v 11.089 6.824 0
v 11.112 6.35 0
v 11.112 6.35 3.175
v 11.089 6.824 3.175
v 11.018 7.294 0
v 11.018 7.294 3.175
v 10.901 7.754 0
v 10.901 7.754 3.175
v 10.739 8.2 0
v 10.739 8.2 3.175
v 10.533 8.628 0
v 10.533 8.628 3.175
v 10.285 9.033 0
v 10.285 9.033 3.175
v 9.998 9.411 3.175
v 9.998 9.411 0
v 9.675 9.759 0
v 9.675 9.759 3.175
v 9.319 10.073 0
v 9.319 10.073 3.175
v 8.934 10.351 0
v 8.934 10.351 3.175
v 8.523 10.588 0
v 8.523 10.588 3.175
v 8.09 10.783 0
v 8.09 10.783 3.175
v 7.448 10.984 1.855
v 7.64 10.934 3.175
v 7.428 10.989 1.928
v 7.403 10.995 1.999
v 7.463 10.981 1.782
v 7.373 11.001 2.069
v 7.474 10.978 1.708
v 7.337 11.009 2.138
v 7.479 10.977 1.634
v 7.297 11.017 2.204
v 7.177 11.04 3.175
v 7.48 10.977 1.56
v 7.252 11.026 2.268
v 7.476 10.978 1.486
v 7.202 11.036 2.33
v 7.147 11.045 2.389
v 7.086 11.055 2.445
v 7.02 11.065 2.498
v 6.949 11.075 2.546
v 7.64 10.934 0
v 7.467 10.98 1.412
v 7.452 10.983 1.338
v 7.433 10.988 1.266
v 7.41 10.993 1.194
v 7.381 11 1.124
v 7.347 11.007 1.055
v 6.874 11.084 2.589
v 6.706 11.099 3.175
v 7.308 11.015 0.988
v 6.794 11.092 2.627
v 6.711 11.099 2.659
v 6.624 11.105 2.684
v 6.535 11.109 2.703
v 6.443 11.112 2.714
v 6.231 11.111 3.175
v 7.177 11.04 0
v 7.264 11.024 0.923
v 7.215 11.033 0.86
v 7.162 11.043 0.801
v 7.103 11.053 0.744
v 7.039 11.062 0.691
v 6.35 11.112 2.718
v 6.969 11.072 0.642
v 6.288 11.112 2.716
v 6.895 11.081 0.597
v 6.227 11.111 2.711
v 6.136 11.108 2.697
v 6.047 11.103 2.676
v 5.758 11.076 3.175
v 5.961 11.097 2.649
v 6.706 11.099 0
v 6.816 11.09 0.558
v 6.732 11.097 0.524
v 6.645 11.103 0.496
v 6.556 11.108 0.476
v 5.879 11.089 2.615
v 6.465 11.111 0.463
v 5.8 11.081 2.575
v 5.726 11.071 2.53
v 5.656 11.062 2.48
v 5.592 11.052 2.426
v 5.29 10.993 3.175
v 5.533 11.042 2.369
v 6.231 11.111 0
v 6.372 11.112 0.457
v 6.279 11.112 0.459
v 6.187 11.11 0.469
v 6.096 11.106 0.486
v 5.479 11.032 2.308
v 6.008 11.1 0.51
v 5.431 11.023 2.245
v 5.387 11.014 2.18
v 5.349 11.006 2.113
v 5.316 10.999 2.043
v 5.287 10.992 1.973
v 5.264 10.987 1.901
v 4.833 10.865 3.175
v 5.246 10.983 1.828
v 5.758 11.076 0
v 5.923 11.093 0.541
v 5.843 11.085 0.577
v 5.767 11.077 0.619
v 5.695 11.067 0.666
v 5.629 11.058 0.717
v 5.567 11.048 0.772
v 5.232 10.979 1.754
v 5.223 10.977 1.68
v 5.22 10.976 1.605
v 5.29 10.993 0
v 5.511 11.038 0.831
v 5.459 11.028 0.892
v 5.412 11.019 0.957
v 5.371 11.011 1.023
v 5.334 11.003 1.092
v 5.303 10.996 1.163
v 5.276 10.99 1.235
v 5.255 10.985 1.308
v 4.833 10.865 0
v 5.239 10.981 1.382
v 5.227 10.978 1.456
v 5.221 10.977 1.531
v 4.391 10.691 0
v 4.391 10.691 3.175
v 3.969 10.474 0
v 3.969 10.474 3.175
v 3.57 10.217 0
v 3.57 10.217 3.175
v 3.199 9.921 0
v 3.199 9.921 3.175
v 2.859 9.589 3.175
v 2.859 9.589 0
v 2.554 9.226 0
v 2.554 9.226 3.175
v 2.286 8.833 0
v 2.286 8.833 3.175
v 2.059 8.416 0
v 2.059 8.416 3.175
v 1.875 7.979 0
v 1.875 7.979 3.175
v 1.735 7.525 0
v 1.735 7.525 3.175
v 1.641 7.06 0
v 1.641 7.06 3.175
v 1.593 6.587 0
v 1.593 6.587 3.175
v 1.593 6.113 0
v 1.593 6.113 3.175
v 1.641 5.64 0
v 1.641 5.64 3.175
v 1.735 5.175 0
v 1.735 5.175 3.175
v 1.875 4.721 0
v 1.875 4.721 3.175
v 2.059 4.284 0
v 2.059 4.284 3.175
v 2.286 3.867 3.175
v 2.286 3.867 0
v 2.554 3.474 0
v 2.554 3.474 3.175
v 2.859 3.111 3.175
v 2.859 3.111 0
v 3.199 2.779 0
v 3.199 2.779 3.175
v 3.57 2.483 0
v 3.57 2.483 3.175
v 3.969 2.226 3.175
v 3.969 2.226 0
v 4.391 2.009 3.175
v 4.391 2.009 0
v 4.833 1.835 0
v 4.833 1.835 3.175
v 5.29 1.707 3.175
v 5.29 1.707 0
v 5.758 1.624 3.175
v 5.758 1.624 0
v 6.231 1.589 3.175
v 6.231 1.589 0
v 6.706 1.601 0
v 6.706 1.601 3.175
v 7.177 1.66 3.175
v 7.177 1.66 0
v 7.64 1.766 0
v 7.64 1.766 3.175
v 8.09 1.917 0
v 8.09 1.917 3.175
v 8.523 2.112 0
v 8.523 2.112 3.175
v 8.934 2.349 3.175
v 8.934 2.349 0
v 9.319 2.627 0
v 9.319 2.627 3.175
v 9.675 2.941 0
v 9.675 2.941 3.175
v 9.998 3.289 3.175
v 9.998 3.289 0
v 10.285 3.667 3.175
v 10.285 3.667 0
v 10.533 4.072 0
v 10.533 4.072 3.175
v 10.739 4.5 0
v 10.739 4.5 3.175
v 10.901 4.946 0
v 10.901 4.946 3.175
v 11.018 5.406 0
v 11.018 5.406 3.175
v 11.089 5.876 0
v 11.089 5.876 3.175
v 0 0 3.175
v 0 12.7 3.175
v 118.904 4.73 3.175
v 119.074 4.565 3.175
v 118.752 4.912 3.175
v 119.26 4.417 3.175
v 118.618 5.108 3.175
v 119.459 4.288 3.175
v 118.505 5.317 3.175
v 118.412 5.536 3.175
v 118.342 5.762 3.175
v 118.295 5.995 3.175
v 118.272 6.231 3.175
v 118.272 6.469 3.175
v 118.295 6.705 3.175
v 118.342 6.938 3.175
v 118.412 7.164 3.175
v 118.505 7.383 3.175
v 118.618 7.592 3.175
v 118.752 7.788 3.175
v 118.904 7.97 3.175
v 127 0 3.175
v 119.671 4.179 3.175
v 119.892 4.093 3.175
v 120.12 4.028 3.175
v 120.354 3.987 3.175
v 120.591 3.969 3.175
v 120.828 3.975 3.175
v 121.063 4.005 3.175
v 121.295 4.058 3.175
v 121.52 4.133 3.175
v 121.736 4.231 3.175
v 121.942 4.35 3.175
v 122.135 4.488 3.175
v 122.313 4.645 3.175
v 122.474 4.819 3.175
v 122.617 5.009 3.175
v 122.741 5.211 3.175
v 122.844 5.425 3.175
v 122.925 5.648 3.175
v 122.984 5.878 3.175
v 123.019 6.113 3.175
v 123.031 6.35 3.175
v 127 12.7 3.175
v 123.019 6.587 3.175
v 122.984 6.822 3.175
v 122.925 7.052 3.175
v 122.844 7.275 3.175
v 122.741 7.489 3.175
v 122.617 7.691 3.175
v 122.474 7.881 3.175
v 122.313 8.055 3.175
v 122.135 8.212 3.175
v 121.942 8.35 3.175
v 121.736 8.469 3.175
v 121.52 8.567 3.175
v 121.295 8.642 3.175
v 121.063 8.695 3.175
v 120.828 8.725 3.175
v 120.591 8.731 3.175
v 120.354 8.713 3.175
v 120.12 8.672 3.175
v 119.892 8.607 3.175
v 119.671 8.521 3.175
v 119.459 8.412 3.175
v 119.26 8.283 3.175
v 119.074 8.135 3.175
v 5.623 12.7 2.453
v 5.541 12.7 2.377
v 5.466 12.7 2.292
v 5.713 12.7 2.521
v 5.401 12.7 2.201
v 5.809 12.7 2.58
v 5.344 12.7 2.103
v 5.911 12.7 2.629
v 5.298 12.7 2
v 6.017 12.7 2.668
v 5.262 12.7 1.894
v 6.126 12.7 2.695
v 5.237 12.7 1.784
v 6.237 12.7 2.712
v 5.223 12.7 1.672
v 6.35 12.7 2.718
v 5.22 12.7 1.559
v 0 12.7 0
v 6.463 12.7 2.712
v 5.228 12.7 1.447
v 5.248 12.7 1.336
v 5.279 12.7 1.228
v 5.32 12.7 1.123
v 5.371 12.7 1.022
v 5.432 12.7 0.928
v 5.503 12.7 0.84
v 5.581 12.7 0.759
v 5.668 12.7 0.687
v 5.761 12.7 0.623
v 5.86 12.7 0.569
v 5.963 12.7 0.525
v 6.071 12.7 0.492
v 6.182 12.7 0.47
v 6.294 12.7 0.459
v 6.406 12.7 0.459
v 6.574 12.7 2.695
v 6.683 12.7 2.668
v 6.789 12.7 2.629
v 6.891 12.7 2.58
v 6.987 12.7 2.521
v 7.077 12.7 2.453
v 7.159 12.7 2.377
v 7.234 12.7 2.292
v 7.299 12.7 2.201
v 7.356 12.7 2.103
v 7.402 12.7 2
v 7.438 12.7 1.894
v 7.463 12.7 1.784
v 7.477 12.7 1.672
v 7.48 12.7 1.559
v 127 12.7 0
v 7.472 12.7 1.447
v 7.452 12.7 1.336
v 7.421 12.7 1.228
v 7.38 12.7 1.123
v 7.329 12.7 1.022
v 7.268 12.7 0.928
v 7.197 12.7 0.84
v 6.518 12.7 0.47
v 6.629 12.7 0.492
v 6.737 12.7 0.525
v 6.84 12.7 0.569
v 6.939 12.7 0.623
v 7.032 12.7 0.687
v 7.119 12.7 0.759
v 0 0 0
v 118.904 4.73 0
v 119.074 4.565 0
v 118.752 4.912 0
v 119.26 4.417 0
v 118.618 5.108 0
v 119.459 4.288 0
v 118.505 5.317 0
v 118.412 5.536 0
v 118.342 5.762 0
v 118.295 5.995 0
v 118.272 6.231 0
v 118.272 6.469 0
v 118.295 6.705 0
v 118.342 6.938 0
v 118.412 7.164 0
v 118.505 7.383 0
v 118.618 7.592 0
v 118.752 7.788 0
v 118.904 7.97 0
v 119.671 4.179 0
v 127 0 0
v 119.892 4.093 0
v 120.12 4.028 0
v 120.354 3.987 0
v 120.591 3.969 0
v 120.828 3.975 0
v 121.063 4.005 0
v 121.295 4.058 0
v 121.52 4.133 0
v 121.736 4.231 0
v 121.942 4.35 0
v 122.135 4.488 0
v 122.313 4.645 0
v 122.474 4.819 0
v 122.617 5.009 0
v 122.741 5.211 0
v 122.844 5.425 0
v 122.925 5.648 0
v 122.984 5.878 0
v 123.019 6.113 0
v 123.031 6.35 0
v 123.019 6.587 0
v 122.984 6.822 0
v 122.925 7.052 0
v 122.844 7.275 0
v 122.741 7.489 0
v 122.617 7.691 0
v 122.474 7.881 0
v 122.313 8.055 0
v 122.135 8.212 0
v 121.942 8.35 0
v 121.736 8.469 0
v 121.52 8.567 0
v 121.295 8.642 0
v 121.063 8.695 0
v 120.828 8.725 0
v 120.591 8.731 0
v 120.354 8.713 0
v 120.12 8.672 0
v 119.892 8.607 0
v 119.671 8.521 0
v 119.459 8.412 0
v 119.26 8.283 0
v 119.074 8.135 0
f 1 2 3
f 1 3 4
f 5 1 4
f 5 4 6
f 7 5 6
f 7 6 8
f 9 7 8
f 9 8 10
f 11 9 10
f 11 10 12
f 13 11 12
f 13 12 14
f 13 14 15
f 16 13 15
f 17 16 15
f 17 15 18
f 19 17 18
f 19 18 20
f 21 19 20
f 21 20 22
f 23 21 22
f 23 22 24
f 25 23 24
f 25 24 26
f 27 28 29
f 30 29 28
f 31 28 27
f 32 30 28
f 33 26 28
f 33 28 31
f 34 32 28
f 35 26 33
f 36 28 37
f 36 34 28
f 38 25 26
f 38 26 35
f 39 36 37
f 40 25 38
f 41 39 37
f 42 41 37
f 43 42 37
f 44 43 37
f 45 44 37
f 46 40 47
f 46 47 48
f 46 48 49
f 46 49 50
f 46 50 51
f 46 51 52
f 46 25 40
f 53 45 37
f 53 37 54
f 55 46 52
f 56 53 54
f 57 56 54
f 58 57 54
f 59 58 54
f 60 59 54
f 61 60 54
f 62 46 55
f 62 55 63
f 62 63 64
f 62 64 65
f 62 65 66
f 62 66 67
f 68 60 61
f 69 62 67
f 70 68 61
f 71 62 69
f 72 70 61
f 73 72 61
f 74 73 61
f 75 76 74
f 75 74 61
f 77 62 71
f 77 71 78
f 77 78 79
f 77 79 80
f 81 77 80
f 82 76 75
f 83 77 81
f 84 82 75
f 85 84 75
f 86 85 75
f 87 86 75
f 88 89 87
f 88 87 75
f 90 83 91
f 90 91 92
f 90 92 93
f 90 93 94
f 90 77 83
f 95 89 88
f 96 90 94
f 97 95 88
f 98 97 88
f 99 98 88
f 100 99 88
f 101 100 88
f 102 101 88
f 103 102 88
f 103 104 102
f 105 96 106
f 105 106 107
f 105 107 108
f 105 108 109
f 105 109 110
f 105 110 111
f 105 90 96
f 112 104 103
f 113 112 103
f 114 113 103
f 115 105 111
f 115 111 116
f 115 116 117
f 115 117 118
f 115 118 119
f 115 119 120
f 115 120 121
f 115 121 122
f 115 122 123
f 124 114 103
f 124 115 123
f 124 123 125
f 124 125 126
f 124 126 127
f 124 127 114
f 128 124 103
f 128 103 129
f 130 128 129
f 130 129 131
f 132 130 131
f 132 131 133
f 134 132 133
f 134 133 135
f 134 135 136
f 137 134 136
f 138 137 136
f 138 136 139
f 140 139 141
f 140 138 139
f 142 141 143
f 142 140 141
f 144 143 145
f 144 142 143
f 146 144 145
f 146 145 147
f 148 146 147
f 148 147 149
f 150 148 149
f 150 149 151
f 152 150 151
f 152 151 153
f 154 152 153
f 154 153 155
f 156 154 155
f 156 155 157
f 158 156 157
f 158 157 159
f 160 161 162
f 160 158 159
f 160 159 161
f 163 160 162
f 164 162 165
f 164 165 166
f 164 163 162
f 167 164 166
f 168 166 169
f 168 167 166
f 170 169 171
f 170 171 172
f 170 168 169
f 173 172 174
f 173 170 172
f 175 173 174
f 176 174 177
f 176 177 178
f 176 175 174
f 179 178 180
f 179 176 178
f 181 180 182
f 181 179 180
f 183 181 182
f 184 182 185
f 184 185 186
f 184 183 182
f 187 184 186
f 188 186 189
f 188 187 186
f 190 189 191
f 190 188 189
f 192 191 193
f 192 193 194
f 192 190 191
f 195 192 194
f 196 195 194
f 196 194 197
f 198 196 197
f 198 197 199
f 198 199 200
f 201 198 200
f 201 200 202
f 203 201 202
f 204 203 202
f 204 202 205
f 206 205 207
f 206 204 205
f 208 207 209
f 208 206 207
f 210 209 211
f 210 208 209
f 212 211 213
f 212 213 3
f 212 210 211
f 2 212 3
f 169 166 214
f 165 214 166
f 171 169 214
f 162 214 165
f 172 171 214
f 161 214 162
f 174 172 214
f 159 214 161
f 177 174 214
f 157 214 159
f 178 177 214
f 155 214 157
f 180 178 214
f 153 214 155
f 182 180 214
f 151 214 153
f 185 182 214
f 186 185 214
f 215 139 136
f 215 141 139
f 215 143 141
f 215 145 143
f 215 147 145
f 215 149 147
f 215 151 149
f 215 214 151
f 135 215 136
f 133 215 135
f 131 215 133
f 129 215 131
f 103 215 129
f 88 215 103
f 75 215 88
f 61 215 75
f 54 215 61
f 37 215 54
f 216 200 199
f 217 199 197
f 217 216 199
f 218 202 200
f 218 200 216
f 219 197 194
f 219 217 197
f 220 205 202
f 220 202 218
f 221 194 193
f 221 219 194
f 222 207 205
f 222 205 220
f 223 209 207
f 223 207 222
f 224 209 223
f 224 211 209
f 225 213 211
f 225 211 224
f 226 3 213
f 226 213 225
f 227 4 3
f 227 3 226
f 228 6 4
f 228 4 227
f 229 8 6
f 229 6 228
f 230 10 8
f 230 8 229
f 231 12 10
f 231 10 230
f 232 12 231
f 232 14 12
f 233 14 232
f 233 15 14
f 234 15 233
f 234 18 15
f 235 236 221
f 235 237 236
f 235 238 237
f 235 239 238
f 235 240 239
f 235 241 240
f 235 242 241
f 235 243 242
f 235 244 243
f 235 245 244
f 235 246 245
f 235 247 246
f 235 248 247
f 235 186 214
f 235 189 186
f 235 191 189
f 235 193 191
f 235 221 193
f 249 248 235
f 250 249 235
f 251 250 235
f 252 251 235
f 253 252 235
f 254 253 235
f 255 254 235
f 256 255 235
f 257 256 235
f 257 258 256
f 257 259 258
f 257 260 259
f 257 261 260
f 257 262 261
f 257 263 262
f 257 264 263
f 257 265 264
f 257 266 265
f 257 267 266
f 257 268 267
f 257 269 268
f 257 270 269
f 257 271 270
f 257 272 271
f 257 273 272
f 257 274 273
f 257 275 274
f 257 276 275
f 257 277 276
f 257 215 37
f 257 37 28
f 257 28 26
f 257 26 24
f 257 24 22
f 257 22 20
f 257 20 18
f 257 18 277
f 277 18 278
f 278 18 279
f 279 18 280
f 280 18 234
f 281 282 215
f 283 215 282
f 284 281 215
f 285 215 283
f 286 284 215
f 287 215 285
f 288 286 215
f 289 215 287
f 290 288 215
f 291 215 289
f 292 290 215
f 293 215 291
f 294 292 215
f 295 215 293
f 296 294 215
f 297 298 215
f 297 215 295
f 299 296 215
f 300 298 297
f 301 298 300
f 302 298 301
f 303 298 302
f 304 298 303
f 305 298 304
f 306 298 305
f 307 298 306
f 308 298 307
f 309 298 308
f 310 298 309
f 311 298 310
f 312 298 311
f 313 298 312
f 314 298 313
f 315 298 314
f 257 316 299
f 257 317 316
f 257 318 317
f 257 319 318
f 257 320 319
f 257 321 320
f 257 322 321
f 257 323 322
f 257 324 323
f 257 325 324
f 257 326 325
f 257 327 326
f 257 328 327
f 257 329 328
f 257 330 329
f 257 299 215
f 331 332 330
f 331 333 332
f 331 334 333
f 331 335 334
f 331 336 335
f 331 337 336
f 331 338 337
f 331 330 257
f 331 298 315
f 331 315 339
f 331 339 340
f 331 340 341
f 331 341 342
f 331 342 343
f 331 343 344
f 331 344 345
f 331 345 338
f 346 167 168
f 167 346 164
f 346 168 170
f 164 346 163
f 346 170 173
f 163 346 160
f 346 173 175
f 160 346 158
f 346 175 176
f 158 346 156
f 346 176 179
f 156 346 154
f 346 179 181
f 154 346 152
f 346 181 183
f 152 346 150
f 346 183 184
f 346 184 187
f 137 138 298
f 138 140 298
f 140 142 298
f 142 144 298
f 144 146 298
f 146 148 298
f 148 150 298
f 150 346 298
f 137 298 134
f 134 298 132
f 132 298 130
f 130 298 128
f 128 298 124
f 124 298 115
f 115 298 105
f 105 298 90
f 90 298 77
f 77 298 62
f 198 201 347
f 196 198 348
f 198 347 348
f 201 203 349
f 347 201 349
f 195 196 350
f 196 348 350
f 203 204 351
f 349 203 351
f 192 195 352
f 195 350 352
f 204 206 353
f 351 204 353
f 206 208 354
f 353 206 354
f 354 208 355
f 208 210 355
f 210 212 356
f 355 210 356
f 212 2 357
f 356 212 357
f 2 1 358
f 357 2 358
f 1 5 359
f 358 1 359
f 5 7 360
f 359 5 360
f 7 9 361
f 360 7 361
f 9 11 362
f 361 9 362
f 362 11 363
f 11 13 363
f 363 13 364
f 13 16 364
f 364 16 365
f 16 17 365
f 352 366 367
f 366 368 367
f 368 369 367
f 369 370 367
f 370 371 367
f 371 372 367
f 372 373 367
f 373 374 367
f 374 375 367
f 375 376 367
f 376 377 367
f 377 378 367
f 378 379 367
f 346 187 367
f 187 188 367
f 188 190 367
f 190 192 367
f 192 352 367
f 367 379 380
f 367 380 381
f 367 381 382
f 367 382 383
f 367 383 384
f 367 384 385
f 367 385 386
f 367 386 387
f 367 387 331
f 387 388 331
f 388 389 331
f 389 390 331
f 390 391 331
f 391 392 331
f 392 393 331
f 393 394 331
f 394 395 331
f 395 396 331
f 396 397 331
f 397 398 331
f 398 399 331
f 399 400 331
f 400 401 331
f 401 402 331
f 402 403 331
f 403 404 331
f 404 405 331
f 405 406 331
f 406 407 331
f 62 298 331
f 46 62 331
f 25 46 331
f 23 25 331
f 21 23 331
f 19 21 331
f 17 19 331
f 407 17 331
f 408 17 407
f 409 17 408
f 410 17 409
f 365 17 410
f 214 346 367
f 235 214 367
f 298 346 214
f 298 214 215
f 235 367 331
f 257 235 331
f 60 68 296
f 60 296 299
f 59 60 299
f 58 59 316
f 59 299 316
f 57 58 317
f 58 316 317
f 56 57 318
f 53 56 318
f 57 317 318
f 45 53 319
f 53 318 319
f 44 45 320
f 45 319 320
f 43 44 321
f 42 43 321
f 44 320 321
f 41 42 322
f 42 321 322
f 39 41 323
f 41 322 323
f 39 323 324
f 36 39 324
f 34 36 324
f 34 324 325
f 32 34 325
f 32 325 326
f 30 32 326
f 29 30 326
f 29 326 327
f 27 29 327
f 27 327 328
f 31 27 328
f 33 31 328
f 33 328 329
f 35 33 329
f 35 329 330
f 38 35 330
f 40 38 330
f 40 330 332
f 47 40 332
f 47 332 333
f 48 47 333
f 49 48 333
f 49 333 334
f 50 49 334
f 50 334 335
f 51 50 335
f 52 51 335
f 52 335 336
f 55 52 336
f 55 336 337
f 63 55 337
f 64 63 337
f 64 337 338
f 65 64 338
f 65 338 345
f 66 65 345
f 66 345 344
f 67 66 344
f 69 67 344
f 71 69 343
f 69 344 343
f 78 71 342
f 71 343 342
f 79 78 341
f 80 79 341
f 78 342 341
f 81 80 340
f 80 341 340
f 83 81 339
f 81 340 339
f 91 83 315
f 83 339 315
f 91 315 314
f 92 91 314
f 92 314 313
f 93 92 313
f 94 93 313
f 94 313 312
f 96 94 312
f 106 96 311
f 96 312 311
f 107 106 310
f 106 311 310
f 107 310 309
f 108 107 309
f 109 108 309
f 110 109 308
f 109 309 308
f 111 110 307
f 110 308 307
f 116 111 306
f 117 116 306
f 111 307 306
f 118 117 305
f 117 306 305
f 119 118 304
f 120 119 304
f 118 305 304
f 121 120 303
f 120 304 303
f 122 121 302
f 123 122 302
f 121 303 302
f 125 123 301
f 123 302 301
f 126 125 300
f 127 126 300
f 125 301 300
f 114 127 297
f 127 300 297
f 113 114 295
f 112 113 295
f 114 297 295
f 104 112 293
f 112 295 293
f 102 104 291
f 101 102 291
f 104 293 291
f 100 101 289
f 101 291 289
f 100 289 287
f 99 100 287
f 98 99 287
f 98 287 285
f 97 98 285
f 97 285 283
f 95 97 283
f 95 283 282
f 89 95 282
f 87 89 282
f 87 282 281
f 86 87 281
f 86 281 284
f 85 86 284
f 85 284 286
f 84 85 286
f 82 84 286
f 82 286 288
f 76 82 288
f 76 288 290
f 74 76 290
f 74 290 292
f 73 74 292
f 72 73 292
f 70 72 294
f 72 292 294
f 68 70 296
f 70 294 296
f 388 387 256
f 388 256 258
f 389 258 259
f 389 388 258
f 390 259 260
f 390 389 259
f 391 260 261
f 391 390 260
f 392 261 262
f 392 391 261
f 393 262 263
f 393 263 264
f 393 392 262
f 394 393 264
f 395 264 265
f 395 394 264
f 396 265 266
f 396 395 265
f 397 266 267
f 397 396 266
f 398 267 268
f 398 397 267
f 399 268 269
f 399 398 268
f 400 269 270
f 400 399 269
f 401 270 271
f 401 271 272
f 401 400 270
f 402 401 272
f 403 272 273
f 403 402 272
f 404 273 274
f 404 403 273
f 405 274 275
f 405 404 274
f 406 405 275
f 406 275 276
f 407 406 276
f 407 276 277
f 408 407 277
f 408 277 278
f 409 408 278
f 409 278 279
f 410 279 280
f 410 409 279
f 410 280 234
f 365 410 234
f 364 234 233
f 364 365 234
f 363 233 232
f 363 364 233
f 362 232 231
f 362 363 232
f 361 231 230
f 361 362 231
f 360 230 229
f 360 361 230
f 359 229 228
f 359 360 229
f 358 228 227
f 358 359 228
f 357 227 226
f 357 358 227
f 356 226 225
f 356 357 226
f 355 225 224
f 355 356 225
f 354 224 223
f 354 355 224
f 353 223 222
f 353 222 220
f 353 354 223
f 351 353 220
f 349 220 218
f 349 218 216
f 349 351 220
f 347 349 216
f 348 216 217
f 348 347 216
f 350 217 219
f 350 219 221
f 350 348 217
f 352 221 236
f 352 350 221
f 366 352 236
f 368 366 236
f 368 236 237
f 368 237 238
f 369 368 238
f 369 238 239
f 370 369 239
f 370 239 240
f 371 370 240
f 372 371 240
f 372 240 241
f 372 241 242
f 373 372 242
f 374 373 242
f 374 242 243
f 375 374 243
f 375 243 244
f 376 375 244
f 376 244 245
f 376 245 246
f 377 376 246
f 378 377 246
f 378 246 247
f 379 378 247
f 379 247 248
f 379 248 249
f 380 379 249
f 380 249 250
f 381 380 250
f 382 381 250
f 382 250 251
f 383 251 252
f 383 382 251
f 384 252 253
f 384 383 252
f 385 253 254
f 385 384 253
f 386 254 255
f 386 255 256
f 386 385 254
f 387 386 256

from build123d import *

# Parameters (mm, degrees)
SKETCH1_W           = 127
SKETCH1_H           = 12.7
SKETCH1_R           = 4.7625
SKETCH1_R_2         = 2.38125
BOSS_EXTRUDE1_DEPTH = 3.175
SKETCH2_R           = 1.1303
CUT_EXTRUDE1_DEPTH  = 6.35


with BuildPart() as part:
    # Sketch1 → Boss-Extrude1 (new body)
    with BuildSketch(Plane.XY):
        with Locations((63.5, 6.35)):
            Rectangle(SKETCH1_W, SKETCH1_H)
        with Locations((6.35, 6.35)):
            Circle(SKETCH1_R, mode=Mode.SUBTRACT)
        with Locations((120.65, 6.35)):
            Circle(SKETCH1_R_2, mode=Mode.SUBTRACT)
    extrude(amount=BOSS_EXTRUDE1_DEPTH)

    # Sketch2 → Cut-Extrude1 (cut)
    with BuildSketch(Plane(origin=(0, 12.7, 0), x_dir=(1, 0, 0), z_dir=(0, 1, 0))):
        with Locations(Location((6.35, -1.5875, 0), (0, 0, 270))):
            Circle(SKETCH2_R)
    extrude(amount=-CUT_EXTRUDE1_DEPTH, mode=Mode.SUBTRACT)


solid = part.part
